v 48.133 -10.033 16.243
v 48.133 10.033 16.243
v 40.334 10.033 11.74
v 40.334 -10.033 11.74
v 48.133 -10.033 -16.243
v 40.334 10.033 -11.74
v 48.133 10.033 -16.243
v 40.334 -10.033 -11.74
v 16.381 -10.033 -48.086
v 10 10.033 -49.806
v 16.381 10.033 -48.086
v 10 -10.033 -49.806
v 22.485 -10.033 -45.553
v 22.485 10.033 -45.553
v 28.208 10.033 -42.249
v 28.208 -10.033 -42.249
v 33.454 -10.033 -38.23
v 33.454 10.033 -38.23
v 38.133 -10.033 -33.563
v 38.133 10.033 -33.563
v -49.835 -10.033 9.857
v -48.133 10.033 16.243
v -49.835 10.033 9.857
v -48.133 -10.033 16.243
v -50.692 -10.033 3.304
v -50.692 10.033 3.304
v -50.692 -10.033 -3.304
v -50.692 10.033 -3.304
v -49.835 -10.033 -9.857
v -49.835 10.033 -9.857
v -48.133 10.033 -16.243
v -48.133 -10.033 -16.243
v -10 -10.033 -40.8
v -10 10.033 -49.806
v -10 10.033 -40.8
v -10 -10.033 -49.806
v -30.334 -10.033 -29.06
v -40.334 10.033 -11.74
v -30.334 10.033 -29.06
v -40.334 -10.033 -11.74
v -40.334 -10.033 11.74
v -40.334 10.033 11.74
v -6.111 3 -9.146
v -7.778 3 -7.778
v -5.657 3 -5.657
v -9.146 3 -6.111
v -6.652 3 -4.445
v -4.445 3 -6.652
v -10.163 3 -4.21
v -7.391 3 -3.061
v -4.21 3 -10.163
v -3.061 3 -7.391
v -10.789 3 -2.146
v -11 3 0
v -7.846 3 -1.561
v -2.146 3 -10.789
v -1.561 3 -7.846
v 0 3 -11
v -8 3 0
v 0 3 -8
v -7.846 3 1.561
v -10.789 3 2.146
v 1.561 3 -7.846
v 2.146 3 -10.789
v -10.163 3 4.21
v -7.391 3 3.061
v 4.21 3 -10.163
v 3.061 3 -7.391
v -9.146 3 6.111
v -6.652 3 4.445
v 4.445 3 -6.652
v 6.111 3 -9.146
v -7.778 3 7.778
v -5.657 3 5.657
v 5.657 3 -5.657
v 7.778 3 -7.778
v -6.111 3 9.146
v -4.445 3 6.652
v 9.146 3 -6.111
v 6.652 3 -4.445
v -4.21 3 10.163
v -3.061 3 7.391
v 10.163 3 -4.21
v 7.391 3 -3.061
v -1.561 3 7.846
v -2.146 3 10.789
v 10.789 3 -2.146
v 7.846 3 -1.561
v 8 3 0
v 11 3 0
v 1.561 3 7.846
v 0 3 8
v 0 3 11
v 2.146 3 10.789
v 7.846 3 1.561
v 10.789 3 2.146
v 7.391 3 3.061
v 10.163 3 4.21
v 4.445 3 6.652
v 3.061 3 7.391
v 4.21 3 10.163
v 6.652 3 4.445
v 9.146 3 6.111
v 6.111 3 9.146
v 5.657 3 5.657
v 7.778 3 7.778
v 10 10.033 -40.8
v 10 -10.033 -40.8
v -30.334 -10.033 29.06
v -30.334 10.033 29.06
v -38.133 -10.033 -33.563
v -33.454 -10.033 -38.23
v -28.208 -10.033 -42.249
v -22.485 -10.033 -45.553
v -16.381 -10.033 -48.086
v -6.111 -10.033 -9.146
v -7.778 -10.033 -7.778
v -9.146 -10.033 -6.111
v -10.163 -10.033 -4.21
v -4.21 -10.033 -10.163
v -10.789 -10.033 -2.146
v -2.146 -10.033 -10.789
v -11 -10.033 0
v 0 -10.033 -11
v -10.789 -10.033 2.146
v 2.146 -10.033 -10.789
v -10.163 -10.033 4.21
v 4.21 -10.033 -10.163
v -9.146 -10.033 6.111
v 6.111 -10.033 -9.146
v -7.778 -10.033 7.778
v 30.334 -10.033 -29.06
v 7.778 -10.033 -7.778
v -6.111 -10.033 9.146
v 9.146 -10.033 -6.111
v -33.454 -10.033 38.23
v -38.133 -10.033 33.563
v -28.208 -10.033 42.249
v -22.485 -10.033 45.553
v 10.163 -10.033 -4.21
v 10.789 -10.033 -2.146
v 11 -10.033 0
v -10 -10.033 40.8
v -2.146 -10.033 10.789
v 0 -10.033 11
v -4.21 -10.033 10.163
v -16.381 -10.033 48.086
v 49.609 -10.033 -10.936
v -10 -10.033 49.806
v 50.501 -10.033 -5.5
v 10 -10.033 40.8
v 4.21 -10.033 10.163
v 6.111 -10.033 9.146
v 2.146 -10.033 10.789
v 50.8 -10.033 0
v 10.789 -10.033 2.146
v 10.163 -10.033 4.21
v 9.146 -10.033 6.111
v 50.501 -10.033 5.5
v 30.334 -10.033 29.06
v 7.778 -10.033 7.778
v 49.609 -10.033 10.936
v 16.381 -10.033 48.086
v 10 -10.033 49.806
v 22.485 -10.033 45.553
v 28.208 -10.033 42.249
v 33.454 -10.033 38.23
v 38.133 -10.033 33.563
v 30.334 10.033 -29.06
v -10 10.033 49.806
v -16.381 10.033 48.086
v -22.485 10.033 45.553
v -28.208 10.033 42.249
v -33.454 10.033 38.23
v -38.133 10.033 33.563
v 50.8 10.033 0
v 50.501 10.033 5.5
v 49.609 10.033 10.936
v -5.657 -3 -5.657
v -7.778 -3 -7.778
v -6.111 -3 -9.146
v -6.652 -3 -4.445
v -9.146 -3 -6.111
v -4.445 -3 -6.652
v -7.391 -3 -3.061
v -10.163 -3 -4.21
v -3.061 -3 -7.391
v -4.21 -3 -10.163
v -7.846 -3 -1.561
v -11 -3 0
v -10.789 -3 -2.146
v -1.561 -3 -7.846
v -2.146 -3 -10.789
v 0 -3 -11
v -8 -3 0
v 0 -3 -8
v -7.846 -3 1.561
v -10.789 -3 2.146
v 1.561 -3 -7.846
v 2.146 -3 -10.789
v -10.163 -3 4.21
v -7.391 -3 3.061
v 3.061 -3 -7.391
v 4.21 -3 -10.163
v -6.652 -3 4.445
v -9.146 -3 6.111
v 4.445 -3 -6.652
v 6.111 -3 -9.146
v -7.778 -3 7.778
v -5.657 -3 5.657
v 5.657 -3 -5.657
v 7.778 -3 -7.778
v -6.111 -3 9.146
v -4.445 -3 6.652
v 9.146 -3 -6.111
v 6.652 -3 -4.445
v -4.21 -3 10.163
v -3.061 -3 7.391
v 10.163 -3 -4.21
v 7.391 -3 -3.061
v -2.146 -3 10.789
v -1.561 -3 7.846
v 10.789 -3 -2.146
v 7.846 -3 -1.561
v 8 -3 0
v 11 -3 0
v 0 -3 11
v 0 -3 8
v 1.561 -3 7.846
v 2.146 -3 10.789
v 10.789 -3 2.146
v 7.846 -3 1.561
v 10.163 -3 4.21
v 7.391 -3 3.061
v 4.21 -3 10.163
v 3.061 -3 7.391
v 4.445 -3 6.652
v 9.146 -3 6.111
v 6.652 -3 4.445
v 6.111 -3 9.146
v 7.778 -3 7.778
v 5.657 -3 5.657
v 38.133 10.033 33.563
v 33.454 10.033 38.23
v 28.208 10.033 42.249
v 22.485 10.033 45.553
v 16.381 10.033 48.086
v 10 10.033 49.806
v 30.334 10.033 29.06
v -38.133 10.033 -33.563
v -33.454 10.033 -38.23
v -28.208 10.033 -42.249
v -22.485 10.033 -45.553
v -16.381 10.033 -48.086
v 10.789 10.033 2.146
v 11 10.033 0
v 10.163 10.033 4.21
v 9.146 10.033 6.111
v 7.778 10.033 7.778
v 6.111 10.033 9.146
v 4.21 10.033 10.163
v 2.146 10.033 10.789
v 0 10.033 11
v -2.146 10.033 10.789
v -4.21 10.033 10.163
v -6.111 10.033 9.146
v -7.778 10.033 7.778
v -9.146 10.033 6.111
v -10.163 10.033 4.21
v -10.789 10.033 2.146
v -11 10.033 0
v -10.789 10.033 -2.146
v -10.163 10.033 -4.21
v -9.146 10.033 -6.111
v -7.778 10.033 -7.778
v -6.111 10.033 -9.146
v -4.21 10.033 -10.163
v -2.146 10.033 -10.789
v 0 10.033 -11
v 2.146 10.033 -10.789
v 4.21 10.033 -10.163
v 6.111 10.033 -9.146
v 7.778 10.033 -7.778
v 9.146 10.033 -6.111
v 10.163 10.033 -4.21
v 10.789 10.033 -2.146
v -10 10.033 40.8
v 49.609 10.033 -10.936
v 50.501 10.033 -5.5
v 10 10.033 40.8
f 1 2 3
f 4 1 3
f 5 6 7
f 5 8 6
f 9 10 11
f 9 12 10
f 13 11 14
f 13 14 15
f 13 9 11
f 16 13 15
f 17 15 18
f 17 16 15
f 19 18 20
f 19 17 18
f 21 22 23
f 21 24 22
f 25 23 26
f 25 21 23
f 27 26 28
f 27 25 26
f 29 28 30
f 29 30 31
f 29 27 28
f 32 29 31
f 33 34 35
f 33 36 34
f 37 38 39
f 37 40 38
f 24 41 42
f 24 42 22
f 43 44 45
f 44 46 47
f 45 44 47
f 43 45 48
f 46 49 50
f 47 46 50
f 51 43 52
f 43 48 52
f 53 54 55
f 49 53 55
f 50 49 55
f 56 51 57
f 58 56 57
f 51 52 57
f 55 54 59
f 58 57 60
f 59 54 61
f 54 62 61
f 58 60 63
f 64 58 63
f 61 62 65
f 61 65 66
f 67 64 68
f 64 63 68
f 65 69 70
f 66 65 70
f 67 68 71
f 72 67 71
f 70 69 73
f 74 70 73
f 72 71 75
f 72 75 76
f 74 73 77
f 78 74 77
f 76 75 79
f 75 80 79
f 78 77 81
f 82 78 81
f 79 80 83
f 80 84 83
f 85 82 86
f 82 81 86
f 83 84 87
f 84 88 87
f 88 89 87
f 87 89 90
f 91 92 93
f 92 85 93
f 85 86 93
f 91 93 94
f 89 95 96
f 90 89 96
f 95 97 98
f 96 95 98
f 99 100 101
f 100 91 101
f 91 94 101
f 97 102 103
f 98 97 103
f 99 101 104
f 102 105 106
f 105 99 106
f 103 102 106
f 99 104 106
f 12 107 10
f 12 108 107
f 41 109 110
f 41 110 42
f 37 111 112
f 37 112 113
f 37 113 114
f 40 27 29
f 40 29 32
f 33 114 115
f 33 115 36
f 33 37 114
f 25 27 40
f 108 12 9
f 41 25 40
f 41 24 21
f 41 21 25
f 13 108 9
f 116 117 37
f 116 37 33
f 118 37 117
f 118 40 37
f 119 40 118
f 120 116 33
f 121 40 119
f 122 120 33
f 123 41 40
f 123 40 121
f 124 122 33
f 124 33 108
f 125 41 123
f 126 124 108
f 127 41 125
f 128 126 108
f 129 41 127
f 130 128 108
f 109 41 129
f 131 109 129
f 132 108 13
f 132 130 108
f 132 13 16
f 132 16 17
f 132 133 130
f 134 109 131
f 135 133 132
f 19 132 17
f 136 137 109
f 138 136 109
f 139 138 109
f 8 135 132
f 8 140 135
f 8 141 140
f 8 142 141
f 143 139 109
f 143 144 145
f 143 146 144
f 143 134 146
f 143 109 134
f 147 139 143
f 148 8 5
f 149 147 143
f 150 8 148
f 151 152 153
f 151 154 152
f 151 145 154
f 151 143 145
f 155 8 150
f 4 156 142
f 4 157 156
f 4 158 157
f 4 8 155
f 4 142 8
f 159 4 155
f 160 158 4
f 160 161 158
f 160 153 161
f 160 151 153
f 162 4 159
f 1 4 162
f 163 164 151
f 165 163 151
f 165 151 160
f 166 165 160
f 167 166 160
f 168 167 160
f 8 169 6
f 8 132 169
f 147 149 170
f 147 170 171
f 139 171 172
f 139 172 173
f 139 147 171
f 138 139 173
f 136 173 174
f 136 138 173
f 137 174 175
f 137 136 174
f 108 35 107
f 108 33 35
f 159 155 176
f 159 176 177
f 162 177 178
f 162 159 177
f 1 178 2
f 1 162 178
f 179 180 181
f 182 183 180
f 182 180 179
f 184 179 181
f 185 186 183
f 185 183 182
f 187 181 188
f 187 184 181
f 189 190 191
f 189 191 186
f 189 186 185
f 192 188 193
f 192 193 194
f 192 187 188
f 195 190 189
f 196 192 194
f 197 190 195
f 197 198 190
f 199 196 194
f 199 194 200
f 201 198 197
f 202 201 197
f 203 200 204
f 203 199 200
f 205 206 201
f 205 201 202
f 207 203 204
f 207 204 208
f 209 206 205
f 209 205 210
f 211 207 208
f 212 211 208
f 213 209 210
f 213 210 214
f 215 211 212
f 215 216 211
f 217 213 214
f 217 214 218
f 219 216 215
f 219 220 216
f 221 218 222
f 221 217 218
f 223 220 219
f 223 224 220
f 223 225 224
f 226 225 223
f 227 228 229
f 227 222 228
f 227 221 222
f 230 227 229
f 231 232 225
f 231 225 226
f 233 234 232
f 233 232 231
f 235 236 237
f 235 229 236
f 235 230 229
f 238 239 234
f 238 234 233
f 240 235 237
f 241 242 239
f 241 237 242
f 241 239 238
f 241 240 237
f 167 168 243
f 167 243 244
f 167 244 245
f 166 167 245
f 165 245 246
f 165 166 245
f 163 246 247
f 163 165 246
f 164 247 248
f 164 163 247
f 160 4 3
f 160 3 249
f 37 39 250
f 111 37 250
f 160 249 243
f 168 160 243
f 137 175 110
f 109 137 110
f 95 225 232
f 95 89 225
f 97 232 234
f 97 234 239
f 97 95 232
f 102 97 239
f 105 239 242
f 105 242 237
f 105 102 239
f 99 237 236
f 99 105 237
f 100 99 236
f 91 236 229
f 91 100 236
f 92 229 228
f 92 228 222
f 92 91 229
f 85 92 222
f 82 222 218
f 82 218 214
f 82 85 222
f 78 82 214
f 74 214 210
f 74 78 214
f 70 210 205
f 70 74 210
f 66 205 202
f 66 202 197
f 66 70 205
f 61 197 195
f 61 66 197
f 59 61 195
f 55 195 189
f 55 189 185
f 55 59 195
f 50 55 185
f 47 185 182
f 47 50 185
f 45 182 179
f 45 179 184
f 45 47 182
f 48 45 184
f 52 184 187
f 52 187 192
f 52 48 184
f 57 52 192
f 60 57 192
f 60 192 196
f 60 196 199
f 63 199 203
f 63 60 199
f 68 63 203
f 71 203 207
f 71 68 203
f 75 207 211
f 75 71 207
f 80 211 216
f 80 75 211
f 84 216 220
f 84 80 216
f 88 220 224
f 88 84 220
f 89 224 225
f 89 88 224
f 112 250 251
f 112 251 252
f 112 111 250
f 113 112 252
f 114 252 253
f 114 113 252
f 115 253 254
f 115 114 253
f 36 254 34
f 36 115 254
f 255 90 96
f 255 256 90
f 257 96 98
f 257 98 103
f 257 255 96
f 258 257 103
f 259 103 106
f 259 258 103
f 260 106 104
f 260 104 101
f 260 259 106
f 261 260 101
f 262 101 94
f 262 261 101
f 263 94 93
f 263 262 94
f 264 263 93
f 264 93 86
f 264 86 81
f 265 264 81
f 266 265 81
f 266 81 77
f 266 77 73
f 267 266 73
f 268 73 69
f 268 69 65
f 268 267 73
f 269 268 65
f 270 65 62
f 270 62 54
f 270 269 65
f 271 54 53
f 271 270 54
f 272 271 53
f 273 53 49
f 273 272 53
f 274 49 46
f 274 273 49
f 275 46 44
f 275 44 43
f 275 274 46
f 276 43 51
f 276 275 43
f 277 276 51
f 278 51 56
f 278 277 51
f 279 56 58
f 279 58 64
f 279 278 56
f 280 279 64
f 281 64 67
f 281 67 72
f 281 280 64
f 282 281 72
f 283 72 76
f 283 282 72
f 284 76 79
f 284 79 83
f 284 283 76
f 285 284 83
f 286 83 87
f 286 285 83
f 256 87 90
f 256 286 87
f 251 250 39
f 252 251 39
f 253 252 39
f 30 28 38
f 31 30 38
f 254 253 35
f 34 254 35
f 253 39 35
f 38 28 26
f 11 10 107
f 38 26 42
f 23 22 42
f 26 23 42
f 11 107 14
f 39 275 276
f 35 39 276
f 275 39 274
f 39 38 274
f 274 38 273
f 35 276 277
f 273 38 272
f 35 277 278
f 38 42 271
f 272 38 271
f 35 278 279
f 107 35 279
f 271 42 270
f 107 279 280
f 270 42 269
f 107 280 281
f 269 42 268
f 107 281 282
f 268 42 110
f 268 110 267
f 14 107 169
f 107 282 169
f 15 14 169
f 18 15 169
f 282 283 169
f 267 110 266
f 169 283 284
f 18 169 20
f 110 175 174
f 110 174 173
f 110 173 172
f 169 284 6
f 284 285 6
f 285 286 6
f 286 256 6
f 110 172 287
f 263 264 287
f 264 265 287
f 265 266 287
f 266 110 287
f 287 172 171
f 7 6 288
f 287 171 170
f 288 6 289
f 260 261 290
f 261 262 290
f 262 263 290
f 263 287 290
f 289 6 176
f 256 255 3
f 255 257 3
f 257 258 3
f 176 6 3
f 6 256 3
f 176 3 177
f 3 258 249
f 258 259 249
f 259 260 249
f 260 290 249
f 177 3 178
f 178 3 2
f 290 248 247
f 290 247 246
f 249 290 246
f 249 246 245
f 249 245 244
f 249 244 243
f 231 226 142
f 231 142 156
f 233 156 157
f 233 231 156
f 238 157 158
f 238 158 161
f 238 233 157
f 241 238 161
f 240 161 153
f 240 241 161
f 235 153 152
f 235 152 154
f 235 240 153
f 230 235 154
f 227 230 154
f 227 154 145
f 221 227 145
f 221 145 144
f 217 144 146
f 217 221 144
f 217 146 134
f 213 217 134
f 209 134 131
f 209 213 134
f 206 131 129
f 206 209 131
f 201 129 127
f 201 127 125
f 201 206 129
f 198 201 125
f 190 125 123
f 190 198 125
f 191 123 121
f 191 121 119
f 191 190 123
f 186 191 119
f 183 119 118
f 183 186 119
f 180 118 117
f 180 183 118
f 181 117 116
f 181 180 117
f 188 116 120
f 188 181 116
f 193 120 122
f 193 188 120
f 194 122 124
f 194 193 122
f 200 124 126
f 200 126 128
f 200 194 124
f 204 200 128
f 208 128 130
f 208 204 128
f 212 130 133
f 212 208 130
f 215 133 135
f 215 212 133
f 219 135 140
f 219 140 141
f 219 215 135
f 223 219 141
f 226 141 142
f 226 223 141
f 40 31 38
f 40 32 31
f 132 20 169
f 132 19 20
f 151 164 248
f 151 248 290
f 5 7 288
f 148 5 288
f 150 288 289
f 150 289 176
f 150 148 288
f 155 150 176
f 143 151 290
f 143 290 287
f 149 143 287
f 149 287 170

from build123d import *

# Parameters (mm, degrees)
F0_R     = 11
F2_DEPTH = 10.033
F1_R     = 11
F1_R_2   = 8
F3_DEPTH = 3


with BuildPart() as f2:
    # F0 (on Front) → F2 (new body, symmetric)
    with BuildSketch(Plane.XZ):
        with BuildLine():
            ThreePointArc((48.133282, -16.242758), (50.128887, -8.230106), (50.8, 0))
            ThreePointArc((50.8, 0), (50.128887, 8.230106), (48.133282, 16.242758))
            Line((48.133282, 16.242758), (40.333836, 11.739746))
            Line((40.333836, 11.739746), (30.333836, 29.060254))
            Line((30.333836, 29.060254), (38.133282, 33.563266))
            ThreePointArc((38.133282, 33.563266), (25.4, 43.994091), (10, 49.806024))
            Line((10, 49.806024), (10, 40.8))
            Line((10, 40.8), (-10, 40.8))
            Line((-10, 40.8), (-10, 49.806024))
            ThreePointArc((-10, 49.806024), (-25.4, 43.994091), (-38.133282, 33.563266))
            Line((-38.133282, 33.563266), (-30.333836, 29.060254))
            Line((-30.333836, 29.060254), (-40.333836, 11.739746))
            Line((-40.333836, 11.739746), (-48.133282, 16.242758))
            ThreePointArc((-48.133282, 16.242758), (-50.8, 0), (-48.133282, -16.242758))
            Line((-48.133282, -16.242758), (-40.333836, -11.739746))
            Line((-40.333836, -11.739746), (-30.333836, -29.060254))
            Line((-30.333836, -29.060254), (-38.133282, -33.563266))
            ThreePointArc((-38.133282, -33.563266), (-25.4, -43.994091), (-10, -49.806024))
            Line((-10, -49.806024), (-10, -40.8))
            Line((-10, -40.8), (10, -40.8))
            Line((10, -40.8), (10, -49.806024))
            ThreePointArc((10, -49.806024), (25.4, -43.994091), (38.133282, -33.563266))
            Line((38.133282, -33.563266), (30.333836, -29.060254))
            Line((30.333836, -29.060254), (40.333836, -11.739746))
            Line((40.333836, -11.739746), (48.133282, -16.242758))
        make_face()
        Circle(F0_R, mode=Mode.SUBTRACT)
    extrude(amount=F2_DEPTH, both=True)

    # F1 (on Front) → F3 (join, symmetric)
    with BuildSketch(Plane.XZ):
        Circle(F1_R)
        Circle(F1_R_2, mode=Mode.SUBTRACT)
    extrude(amount=F3_DEPTH, both=True)


solid = f2.part
